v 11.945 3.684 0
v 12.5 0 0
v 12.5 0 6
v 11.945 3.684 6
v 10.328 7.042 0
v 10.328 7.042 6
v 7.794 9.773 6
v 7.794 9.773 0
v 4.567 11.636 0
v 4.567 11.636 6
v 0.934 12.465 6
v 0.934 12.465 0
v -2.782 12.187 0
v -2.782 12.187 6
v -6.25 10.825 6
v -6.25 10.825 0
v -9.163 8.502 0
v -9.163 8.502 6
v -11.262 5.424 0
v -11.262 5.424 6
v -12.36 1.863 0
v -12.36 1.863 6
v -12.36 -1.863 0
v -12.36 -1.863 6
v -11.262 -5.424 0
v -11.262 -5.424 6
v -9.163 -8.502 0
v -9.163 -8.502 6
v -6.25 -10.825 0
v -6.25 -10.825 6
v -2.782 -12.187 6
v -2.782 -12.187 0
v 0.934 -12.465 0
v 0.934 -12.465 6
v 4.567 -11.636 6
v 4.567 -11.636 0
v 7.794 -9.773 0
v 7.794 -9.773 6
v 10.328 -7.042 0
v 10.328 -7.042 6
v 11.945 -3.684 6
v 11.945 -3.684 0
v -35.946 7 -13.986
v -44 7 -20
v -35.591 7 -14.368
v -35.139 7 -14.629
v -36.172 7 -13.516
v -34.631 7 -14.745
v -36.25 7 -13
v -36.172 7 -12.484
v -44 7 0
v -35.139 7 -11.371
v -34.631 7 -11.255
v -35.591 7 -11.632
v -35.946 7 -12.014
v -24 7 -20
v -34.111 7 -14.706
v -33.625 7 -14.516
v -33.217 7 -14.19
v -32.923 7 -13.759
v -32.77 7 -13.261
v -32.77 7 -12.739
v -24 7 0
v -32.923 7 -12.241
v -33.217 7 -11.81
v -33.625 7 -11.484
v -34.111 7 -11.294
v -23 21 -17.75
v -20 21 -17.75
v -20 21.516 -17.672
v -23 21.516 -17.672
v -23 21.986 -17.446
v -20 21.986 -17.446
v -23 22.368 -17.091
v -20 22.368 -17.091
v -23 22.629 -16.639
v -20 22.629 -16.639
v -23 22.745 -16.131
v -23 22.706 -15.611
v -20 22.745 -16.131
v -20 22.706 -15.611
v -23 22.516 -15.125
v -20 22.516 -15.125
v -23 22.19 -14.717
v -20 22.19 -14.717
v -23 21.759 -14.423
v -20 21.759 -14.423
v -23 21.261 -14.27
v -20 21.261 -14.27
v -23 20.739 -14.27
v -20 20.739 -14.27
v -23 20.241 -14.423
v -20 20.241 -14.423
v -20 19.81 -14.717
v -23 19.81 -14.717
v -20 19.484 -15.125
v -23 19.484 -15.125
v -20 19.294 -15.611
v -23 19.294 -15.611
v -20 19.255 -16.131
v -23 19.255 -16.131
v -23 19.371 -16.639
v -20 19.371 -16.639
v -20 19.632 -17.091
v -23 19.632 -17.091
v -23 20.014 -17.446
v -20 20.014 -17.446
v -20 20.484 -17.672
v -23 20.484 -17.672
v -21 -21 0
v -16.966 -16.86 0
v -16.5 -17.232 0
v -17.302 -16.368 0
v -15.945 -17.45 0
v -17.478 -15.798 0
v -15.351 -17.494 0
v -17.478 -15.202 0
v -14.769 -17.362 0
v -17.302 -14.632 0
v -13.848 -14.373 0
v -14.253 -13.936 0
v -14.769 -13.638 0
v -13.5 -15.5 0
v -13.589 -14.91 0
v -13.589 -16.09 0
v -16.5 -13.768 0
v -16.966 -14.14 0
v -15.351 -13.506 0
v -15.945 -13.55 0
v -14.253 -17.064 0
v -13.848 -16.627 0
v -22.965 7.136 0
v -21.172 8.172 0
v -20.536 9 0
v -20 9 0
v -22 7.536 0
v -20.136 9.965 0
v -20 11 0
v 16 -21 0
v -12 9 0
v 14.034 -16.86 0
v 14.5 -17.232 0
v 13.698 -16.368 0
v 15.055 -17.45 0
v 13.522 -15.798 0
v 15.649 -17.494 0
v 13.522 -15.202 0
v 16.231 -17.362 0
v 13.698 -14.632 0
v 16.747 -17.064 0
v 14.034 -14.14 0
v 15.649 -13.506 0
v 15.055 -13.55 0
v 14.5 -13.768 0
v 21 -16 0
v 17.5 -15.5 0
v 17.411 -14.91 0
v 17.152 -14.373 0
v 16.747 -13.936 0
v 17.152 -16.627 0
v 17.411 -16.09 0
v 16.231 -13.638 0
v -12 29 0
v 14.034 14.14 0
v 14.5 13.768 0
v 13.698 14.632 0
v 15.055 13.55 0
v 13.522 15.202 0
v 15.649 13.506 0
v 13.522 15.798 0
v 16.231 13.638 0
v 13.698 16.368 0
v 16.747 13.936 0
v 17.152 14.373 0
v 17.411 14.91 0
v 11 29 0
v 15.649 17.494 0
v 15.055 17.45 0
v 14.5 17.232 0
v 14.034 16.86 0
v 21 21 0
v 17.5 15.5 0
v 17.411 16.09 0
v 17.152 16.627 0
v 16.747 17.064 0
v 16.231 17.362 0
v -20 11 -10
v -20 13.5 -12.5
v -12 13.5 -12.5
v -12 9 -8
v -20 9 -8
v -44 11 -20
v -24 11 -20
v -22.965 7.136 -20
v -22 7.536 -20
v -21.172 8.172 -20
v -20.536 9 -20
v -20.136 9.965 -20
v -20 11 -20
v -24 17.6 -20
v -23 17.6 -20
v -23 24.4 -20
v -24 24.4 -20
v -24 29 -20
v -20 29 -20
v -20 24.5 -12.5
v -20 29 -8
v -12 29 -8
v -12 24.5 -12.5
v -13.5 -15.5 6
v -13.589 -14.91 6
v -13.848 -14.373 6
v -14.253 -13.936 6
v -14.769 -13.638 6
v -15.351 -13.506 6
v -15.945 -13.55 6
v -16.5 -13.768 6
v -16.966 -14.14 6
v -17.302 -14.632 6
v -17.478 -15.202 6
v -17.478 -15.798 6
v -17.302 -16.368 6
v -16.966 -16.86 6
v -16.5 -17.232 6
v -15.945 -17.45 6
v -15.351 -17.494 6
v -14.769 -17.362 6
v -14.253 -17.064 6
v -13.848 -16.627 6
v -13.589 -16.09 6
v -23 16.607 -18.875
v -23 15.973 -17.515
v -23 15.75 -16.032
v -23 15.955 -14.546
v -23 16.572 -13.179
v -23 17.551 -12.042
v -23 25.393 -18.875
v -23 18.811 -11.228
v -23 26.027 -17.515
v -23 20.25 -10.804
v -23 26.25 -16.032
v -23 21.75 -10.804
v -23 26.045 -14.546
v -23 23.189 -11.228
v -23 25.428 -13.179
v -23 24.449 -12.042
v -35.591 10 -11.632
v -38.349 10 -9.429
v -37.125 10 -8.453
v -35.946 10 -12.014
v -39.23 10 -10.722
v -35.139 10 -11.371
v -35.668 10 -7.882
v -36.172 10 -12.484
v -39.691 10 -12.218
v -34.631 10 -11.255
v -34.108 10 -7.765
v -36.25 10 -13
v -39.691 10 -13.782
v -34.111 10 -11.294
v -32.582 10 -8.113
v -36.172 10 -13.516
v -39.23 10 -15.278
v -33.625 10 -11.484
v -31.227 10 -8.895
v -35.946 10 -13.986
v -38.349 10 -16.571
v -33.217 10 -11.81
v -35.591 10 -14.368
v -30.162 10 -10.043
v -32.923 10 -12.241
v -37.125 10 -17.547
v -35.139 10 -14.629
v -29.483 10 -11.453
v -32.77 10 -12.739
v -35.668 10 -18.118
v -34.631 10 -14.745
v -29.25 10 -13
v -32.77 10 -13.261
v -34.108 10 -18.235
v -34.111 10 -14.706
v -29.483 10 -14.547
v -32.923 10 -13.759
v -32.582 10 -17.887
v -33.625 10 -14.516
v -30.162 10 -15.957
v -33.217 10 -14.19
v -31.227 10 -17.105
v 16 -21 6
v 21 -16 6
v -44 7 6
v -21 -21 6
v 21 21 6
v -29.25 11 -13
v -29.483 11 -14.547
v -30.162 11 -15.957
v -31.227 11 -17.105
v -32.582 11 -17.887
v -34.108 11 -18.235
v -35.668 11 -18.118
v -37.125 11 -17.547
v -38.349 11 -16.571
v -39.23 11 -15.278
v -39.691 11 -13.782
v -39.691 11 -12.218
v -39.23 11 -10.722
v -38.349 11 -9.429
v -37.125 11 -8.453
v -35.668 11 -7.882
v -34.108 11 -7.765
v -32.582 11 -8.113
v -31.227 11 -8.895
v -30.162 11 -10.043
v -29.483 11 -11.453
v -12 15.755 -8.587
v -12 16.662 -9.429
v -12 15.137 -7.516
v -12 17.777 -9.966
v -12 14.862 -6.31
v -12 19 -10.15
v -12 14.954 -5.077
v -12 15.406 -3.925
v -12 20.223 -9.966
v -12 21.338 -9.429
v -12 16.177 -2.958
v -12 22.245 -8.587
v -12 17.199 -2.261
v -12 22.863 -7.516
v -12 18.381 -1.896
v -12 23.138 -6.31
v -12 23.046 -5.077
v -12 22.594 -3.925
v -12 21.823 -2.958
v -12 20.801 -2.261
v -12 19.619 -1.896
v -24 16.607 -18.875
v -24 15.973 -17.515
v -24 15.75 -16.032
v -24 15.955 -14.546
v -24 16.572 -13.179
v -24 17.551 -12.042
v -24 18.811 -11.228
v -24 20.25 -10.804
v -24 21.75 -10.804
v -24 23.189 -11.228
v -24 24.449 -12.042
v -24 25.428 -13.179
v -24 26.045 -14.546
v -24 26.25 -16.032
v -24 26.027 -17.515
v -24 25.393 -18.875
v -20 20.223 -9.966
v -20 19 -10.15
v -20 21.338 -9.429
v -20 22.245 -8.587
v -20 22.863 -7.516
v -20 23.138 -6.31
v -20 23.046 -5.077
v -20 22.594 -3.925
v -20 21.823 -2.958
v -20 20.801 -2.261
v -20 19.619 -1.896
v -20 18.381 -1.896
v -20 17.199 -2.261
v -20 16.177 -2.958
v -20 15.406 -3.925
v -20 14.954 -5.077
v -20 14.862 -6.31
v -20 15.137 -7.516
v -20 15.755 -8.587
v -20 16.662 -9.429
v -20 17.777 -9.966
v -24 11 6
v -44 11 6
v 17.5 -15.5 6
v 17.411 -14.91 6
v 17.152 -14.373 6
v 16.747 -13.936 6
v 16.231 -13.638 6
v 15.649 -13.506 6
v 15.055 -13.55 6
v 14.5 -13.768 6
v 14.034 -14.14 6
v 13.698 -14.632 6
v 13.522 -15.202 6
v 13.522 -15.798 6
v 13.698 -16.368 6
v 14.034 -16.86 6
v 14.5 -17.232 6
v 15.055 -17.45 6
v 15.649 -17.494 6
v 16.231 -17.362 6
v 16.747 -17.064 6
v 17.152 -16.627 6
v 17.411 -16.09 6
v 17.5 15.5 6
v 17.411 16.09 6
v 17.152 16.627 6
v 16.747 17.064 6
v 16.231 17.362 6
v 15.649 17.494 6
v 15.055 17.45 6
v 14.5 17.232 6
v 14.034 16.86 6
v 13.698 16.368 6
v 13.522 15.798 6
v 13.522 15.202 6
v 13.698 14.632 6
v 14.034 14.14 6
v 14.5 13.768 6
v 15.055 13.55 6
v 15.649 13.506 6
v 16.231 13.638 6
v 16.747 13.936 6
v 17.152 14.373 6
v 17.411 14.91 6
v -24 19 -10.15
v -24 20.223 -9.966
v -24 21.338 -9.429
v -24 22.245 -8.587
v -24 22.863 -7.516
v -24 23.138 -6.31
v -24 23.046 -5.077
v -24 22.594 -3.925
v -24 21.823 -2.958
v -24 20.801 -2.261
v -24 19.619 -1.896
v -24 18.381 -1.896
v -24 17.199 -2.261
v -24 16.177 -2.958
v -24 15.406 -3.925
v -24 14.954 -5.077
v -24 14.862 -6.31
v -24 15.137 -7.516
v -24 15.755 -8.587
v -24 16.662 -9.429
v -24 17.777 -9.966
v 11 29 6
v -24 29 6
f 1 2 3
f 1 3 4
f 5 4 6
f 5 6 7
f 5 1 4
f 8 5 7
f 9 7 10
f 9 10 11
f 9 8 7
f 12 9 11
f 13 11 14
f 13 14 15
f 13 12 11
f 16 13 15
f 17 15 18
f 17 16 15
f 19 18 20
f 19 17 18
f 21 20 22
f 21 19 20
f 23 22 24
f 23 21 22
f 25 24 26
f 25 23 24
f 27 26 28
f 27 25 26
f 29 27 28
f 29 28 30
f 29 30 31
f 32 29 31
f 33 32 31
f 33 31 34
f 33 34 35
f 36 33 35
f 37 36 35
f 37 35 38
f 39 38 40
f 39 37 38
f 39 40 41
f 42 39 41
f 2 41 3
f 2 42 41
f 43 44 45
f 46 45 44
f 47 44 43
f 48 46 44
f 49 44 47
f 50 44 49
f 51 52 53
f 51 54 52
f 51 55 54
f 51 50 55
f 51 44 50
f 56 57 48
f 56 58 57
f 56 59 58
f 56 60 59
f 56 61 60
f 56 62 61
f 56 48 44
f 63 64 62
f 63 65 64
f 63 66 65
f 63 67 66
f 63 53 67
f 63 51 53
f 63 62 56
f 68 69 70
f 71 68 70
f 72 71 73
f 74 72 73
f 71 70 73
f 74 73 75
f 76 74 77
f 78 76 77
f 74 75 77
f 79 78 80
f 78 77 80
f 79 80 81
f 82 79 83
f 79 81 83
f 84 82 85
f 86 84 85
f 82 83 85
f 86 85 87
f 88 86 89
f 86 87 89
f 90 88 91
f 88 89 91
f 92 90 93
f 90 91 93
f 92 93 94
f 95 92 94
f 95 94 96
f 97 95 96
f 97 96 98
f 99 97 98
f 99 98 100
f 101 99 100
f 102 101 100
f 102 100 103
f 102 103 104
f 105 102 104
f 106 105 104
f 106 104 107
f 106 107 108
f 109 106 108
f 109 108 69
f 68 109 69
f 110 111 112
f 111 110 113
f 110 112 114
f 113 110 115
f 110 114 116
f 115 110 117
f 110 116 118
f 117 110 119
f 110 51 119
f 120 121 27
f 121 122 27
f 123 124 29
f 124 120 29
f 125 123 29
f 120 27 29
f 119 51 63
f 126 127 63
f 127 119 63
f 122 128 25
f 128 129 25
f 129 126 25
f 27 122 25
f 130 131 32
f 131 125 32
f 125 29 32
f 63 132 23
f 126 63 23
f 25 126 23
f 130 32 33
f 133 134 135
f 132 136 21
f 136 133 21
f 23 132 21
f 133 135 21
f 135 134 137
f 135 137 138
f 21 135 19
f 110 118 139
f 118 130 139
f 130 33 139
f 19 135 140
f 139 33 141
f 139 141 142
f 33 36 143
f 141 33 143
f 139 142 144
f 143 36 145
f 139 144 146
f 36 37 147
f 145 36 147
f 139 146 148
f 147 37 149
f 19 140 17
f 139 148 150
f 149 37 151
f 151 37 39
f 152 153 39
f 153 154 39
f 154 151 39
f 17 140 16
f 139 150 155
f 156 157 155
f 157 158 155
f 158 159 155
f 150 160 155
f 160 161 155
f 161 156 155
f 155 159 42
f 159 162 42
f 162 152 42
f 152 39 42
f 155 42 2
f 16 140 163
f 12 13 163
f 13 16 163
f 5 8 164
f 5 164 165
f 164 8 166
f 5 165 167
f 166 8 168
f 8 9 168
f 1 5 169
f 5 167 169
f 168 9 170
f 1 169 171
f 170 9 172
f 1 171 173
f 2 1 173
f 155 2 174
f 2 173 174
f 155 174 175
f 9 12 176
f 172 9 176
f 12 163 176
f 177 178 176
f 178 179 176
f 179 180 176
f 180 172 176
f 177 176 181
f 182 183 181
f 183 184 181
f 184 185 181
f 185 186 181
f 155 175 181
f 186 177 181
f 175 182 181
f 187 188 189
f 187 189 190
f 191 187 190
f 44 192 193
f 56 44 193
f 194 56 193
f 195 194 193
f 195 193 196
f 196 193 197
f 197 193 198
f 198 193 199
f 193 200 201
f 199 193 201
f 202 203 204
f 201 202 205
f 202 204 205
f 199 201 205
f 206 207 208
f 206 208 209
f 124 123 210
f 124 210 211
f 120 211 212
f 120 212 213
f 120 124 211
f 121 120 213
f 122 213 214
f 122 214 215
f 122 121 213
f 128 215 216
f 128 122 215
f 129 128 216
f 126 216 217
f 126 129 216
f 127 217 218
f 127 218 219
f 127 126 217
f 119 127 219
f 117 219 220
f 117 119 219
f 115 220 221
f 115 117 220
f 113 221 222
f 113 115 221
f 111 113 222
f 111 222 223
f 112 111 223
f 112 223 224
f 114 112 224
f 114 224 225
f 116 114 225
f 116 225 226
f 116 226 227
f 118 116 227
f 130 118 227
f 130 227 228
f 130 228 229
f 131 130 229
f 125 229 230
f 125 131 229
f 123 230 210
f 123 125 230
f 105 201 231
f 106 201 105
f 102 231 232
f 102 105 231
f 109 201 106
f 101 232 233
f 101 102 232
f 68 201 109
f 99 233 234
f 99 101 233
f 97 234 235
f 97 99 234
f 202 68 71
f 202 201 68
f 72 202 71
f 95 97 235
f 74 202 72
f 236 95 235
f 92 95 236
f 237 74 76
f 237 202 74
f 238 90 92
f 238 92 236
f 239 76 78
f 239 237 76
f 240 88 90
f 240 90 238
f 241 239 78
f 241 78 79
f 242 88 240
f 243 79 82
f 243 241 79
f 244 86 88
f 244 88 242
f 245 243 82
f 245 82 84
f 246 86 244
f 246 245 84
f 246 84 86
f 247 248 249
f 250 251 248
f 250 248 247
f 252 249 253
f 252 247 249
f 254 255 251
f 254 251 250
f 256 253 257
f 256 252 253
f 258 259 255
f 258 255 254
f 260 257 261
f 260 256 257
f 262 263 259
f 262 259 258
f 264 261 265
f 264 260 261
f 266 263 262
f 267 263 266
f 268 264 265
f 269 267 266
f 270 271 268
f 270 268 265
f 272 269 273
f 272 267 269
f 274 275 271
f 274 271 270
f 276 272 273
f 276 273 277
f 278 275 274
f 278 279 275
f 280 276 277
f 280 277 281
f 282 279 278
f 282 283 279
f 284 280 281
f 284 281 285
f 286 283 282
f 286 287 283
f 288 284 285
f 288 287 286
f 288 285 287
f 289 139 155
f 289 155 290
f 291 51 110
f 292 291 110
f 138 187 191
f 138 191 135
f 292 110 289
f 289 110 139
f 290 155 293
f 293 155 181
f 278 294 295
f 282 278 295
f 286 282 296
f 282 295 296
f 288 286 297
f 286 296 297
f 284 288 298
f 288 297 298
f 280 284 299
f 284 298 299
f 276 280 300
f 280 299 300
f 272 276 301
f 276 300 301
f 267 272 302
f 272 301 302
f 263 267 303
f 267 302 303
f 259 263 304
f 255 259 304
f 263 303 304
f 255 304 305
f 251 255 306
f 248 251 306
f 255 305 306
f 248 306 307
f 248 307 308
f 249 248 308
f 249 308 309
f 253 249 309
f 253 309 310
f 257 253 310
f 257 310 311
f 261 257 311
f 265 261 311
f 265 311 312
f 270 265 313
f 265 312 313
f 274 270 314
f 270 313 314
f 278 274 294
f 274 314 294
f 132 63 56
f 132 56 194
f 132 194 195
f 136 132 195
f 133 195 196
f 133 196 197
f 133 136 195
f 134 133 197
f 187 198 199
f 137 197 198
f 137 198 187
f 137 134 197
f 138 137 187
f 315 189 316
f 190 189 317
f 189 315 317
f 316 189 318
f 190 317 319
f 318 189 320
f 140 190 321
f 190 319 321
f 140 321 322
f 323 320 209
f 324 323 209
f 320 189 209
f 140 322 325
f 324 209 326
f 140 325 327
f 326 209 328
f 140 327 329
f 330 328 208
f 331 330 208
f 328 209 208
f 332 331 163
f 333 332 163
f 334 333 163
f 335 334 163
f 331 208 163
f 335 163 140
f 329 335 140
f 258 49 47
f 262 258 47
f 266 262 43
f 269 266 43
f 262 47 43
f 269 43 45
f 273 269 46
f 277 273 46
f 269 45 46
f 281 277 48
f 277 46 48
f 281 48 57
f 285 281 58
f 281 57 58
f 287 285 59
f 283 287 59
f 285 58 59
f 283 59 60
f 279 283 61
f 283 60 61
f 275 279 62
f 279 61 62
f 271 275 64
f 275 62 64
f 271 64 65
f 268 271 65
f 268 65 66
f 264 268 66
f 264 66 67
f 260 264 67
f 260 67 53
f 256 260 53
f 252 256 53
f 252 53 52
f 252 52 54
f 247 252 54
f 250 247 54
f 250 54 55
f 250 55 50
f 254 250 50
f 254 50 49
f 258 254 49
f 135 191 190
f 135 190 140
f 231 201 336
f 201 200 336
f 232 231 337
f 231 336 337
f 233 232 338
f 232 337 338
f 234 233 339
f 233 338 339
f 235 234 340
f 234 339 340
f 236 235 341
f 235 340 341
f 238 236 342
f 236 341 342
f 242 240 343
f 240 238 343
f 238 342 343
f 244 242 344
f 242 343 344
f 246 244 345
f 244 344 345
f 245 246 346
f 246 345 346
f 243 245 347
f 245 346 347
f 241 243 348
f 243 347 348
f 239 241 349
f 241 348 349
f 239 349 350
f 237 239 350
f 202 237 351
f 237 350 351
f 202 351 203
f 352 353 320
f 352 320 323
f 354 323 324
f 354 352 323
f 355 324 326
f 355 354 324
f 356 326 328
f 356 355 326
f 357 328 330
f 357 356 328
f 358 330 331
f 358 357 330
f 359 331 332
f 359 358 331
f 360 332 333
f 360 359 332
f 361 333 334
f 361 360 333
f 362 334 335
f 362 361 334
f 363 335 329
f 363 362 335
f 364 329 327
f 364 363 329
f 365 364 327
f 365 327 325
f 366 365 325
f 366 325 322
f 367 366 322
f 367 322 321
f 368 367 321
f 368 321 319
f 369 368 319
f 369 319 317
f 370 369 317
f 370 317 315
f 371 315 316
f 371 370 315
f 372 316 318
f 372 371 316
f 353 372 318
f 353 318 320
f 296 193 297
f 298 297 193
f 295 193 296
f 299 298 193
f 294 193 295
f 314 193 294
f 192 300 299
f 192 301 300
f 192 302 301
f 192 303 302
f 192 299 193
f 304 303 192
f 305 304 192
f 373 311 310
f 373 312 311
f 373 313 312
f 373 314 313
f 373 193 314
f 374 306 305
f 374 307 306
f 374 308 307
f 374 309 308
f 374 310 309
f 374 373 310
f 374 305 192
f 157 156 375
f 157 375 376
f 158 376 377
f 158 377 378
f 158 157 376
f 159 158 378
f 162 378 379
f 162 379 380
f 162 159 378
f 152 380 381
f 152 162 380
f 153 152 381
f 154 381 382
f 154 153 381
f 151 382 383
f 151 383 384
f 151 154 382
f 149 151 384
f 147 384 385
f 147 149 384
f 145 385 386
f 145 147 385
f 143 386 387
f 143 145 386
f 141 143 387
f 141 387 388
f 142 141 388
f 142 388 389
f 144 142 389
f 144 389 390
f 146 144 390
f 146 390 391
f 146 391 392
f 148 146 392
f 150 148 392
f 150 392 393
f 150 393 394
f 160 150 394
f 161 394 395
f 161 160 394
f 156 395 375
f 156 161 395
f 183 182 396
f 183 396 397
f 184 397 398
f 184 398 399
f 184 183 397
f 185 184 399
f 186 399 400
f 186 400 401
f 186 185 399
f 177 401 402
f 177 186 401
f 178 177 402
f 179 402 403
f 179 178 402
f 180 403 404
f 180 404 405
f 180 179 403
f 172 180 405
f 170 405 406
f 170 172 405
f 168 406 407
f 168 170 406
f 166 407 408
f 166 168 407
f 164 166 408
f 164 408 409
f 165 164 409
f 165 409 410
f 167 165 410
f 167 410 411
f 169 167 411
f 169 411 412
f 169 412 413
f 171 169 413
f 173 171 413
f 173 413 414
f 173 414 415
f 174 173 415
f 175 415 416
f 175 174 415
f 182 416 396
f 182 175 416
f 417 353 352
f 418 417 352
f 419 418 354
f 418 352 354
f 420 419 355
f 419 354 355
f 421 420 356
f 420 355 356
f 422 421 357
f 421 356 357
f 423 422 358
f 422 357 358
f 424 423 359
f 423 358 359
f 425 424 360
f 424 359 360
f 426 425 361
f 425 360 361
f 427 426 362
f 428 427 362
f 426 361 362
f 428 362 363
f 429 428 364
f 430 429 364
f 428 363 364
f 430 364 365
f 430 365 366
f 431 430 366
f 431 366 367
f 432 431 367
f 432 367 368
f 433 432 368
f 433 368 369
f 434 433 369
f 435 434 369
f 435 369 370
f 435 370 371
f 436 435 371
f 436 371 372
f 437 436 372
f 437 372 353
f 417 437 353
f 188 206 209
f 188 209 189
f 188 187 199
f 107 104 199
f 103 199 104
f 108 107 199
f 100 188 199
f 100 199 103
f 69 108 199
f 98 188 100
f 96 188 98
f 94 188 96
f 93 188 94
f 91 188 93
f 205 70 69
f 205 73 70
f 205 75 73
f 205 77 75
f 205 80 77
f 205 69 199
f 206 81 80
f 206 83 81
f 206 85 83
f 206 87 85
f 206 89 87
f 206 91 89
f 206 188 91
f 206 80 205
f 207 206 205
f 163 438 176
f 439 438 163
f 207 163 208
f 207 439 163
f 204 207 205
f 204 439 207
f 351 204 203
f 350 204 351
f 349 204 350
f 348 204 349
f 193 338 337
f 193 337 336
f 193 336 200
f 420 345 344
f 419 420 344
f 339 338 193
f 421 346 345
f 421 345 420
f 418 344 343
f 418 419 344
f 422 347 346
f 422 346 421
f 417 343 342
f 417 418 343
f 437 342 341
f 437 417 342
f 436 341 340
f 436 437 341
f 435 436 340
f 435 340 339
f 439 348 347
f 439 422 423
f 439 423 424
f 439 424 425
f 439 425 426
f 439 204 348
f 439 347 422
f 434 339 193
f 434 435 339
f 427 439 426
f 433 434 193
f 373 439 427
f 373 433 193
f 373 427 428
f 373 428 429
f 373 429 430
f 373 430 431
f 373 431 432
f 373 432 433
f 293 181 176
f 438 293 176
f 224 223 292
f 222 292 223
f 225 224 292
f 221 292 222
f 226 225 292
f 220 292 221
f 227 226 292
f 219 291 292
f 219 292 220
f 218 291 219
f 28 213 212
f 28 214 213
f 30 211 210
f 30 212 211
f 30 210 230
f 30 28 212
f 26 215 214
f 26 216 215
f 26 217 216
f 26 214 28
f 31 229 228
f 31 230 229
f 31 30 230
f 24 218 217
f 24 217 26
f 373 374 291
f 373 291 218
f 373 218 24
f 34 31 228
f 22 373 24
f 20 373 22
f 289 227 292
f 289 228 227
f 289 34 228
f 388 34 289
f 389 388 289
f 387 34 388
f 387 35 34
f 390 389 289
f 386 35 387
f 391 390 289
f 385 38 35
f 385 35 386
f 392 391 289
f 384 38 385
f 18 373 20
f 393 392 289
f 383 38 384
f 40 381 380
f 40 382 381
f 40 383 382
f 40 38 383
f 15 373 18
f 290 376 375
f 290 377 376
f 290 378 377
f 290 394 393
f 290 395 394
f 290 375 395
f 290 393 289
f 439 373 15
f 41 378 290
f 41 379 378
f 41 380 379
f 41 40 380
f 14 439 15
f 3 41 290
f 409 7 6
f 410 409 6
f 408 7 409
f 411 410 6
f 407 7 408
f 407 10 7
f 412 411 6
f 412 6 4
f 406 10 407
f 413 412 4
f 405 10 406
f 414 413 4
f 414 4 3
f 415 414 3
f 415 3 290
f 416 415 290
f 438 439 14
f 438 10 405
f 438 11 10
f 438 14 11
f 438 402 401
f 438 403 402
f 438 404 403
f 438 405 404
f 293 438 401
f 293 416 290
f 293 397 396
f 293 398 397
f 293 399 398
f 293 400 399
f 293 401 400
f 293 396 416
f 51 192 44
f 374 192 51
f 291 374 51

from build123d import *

# Parameters (mm, degrees)
ESBO_O1_R                = 12.5
ESBO_O1_R_2              = 2
RESSALTO_EXTRUS_O1_DEPTH = 6
RESSALTO_EXTRUS_O2_DEPTH = 20
ESBO_O3_R                = 4.15
RESSALTO_EXTRUS_O3_DEPTH = 8
ESBO_O5_R                = 1.75
ESBO_O5_R_2              = 4.15
CORTE_EXTRUS_O2_DEPTH    = 12
ESBO_O6_R                = 1.75
CORTE_EXTRUS_O3_DEPTH    = 12
CHANFRO1_SIZE            = 5
ESBO_O8_R                = 5.25
CORTE_EXTRUS_O5_DEPTH    = 1
ESBO_O9_R                = 5.25
CORTE_EXTRUS_O6_DEPTH    = 1


with BuildPart() as part:
    # Esboço1 → Ressalto-extrusão1 (new body)
    with BuildSketch(Plane.XY):
        Polygon((-44, 7), (-21, -21), (21, -21), (21, 21), (11, 29), (-24, 29), (-24, 21), (-24, 11), (-44, 11), align=None)
        Circle(ESBO_O1_R, mode=Mode.SUBTRACT)
        with Locations((15.5, 15.5)):
            Circle(ESBO_O1_R_2, mode=Mode.SUBTRACT)
        with Locations((15.5, -15.5)):
            Circle(ESBO_O1_R_2, mode=Mode.SUBTRACT)
        with Locations((-15.5, -15.5)):
            Circle(ESBO_O1_R_2, mode=Mode.SUBTRACT)
    extrude(amount=RESSALTO_EXTRUS_O1_DEPTH)

    # Esboço2 → Ressalto-extrusão2 (add)
    with BuildSketch(Plane(origin=(0, 0, 0), x_dir=(-1, 0, 0), z_dir=(0, 0, -1))):
        with BuildLine():
            Line((44, 11), (44, 7))
            Line((44, 7), (24, 7))
            ThreePointArc((24, 7), (21.171572875, 8.171572875), (20, 11))
            Line((20, 11), (20, 29))
            Line((20, 29), (24, 29))
            Line((24, 29), (24, 11))
            Line((24, 11), (44, 11))
        make_face()
    extrude(amount=RESSALTO_EXTRUS_O2_DEPTH)

    # Esboço3 → Ressalto-extrusão3 (add)
    with BuildSketch(Plane(origin=(-20, 0, 0), x_dir=(0, 0, -1), z_dir=(1, 0, 0))):
        Polygon((0, 29), (8, 29), (12.5, 24.5), (12.5, 13.5), (8, 9), (0, 9), align=None)
        with Locations((6, 19)):
            Circle(ESBO_O3_R, mode=Mode.SUBTRACT)
    extrude(amount=RESSALTO_EXTRUS_O3_DEPTH)

    # Esboço5 → Corte-extrusão2 (cut)
    with BuildSketch(Plane(origin=(-20, 0, 0), x_dir=(0, 0, -1), z_dir=(1, 0, 0))):
        with Locations((16, 21)):
            Circle(ESBO_O5_R)
        with Locations((6, 19)):
            Circle(ESBO_O5_R_2)
    extrude(amount=-CORTE_EXTRUS_O2_DEPTH, mode=Mode.SUBTRACT)

    # Esboço6 → Corte-extrusão3 (cut)
    with BuildSketch(Plane(origin=(0, 7, 0), x_dir=(-1, 0, 0), z_dir=(0, -1, 0))):
        with Locations((34.5, 13)):
            Circle(ESBO_O6_R)
    extrude(amount=-CORTE_EXTRUS_O3_DEPTH, mode=Mode.SUBTRACT)

    # Chanfro1
    chanfro1_edges = [part.edges().sort_by_distance(p)[0] for p in [
        (21, -21, 3),
    ]]
    chamfer(chanfro1_edges, length=CHANFRO1_SIZE)

    # Esboço8 → Corte-extrusão5 (cut)
    with BuildSketch(Plane.ZY.offset(24)):
        with Locations((-16, 21)):
            Circle(ESBO_O8_R)
    extrude(amount=-CORTE_EXTRUS_O5_DEPTH, mode=Mode.SUBTRACT)

    # Esboço9 → Corte-extrusão6 (cut)
    with BuildSketch(Plane(origin=(0, 11, 0), x_dir=(1, 0, 0), z_dir=(0, 1, 0))):
        with Locations((-34.5, 13)):
            Circle(ESBO_O9_R)
    extrude(amount=-CORTE_EXTRUS_O6_DEPTH, mode=Mode.SUBTRACT)


solid = part.part
